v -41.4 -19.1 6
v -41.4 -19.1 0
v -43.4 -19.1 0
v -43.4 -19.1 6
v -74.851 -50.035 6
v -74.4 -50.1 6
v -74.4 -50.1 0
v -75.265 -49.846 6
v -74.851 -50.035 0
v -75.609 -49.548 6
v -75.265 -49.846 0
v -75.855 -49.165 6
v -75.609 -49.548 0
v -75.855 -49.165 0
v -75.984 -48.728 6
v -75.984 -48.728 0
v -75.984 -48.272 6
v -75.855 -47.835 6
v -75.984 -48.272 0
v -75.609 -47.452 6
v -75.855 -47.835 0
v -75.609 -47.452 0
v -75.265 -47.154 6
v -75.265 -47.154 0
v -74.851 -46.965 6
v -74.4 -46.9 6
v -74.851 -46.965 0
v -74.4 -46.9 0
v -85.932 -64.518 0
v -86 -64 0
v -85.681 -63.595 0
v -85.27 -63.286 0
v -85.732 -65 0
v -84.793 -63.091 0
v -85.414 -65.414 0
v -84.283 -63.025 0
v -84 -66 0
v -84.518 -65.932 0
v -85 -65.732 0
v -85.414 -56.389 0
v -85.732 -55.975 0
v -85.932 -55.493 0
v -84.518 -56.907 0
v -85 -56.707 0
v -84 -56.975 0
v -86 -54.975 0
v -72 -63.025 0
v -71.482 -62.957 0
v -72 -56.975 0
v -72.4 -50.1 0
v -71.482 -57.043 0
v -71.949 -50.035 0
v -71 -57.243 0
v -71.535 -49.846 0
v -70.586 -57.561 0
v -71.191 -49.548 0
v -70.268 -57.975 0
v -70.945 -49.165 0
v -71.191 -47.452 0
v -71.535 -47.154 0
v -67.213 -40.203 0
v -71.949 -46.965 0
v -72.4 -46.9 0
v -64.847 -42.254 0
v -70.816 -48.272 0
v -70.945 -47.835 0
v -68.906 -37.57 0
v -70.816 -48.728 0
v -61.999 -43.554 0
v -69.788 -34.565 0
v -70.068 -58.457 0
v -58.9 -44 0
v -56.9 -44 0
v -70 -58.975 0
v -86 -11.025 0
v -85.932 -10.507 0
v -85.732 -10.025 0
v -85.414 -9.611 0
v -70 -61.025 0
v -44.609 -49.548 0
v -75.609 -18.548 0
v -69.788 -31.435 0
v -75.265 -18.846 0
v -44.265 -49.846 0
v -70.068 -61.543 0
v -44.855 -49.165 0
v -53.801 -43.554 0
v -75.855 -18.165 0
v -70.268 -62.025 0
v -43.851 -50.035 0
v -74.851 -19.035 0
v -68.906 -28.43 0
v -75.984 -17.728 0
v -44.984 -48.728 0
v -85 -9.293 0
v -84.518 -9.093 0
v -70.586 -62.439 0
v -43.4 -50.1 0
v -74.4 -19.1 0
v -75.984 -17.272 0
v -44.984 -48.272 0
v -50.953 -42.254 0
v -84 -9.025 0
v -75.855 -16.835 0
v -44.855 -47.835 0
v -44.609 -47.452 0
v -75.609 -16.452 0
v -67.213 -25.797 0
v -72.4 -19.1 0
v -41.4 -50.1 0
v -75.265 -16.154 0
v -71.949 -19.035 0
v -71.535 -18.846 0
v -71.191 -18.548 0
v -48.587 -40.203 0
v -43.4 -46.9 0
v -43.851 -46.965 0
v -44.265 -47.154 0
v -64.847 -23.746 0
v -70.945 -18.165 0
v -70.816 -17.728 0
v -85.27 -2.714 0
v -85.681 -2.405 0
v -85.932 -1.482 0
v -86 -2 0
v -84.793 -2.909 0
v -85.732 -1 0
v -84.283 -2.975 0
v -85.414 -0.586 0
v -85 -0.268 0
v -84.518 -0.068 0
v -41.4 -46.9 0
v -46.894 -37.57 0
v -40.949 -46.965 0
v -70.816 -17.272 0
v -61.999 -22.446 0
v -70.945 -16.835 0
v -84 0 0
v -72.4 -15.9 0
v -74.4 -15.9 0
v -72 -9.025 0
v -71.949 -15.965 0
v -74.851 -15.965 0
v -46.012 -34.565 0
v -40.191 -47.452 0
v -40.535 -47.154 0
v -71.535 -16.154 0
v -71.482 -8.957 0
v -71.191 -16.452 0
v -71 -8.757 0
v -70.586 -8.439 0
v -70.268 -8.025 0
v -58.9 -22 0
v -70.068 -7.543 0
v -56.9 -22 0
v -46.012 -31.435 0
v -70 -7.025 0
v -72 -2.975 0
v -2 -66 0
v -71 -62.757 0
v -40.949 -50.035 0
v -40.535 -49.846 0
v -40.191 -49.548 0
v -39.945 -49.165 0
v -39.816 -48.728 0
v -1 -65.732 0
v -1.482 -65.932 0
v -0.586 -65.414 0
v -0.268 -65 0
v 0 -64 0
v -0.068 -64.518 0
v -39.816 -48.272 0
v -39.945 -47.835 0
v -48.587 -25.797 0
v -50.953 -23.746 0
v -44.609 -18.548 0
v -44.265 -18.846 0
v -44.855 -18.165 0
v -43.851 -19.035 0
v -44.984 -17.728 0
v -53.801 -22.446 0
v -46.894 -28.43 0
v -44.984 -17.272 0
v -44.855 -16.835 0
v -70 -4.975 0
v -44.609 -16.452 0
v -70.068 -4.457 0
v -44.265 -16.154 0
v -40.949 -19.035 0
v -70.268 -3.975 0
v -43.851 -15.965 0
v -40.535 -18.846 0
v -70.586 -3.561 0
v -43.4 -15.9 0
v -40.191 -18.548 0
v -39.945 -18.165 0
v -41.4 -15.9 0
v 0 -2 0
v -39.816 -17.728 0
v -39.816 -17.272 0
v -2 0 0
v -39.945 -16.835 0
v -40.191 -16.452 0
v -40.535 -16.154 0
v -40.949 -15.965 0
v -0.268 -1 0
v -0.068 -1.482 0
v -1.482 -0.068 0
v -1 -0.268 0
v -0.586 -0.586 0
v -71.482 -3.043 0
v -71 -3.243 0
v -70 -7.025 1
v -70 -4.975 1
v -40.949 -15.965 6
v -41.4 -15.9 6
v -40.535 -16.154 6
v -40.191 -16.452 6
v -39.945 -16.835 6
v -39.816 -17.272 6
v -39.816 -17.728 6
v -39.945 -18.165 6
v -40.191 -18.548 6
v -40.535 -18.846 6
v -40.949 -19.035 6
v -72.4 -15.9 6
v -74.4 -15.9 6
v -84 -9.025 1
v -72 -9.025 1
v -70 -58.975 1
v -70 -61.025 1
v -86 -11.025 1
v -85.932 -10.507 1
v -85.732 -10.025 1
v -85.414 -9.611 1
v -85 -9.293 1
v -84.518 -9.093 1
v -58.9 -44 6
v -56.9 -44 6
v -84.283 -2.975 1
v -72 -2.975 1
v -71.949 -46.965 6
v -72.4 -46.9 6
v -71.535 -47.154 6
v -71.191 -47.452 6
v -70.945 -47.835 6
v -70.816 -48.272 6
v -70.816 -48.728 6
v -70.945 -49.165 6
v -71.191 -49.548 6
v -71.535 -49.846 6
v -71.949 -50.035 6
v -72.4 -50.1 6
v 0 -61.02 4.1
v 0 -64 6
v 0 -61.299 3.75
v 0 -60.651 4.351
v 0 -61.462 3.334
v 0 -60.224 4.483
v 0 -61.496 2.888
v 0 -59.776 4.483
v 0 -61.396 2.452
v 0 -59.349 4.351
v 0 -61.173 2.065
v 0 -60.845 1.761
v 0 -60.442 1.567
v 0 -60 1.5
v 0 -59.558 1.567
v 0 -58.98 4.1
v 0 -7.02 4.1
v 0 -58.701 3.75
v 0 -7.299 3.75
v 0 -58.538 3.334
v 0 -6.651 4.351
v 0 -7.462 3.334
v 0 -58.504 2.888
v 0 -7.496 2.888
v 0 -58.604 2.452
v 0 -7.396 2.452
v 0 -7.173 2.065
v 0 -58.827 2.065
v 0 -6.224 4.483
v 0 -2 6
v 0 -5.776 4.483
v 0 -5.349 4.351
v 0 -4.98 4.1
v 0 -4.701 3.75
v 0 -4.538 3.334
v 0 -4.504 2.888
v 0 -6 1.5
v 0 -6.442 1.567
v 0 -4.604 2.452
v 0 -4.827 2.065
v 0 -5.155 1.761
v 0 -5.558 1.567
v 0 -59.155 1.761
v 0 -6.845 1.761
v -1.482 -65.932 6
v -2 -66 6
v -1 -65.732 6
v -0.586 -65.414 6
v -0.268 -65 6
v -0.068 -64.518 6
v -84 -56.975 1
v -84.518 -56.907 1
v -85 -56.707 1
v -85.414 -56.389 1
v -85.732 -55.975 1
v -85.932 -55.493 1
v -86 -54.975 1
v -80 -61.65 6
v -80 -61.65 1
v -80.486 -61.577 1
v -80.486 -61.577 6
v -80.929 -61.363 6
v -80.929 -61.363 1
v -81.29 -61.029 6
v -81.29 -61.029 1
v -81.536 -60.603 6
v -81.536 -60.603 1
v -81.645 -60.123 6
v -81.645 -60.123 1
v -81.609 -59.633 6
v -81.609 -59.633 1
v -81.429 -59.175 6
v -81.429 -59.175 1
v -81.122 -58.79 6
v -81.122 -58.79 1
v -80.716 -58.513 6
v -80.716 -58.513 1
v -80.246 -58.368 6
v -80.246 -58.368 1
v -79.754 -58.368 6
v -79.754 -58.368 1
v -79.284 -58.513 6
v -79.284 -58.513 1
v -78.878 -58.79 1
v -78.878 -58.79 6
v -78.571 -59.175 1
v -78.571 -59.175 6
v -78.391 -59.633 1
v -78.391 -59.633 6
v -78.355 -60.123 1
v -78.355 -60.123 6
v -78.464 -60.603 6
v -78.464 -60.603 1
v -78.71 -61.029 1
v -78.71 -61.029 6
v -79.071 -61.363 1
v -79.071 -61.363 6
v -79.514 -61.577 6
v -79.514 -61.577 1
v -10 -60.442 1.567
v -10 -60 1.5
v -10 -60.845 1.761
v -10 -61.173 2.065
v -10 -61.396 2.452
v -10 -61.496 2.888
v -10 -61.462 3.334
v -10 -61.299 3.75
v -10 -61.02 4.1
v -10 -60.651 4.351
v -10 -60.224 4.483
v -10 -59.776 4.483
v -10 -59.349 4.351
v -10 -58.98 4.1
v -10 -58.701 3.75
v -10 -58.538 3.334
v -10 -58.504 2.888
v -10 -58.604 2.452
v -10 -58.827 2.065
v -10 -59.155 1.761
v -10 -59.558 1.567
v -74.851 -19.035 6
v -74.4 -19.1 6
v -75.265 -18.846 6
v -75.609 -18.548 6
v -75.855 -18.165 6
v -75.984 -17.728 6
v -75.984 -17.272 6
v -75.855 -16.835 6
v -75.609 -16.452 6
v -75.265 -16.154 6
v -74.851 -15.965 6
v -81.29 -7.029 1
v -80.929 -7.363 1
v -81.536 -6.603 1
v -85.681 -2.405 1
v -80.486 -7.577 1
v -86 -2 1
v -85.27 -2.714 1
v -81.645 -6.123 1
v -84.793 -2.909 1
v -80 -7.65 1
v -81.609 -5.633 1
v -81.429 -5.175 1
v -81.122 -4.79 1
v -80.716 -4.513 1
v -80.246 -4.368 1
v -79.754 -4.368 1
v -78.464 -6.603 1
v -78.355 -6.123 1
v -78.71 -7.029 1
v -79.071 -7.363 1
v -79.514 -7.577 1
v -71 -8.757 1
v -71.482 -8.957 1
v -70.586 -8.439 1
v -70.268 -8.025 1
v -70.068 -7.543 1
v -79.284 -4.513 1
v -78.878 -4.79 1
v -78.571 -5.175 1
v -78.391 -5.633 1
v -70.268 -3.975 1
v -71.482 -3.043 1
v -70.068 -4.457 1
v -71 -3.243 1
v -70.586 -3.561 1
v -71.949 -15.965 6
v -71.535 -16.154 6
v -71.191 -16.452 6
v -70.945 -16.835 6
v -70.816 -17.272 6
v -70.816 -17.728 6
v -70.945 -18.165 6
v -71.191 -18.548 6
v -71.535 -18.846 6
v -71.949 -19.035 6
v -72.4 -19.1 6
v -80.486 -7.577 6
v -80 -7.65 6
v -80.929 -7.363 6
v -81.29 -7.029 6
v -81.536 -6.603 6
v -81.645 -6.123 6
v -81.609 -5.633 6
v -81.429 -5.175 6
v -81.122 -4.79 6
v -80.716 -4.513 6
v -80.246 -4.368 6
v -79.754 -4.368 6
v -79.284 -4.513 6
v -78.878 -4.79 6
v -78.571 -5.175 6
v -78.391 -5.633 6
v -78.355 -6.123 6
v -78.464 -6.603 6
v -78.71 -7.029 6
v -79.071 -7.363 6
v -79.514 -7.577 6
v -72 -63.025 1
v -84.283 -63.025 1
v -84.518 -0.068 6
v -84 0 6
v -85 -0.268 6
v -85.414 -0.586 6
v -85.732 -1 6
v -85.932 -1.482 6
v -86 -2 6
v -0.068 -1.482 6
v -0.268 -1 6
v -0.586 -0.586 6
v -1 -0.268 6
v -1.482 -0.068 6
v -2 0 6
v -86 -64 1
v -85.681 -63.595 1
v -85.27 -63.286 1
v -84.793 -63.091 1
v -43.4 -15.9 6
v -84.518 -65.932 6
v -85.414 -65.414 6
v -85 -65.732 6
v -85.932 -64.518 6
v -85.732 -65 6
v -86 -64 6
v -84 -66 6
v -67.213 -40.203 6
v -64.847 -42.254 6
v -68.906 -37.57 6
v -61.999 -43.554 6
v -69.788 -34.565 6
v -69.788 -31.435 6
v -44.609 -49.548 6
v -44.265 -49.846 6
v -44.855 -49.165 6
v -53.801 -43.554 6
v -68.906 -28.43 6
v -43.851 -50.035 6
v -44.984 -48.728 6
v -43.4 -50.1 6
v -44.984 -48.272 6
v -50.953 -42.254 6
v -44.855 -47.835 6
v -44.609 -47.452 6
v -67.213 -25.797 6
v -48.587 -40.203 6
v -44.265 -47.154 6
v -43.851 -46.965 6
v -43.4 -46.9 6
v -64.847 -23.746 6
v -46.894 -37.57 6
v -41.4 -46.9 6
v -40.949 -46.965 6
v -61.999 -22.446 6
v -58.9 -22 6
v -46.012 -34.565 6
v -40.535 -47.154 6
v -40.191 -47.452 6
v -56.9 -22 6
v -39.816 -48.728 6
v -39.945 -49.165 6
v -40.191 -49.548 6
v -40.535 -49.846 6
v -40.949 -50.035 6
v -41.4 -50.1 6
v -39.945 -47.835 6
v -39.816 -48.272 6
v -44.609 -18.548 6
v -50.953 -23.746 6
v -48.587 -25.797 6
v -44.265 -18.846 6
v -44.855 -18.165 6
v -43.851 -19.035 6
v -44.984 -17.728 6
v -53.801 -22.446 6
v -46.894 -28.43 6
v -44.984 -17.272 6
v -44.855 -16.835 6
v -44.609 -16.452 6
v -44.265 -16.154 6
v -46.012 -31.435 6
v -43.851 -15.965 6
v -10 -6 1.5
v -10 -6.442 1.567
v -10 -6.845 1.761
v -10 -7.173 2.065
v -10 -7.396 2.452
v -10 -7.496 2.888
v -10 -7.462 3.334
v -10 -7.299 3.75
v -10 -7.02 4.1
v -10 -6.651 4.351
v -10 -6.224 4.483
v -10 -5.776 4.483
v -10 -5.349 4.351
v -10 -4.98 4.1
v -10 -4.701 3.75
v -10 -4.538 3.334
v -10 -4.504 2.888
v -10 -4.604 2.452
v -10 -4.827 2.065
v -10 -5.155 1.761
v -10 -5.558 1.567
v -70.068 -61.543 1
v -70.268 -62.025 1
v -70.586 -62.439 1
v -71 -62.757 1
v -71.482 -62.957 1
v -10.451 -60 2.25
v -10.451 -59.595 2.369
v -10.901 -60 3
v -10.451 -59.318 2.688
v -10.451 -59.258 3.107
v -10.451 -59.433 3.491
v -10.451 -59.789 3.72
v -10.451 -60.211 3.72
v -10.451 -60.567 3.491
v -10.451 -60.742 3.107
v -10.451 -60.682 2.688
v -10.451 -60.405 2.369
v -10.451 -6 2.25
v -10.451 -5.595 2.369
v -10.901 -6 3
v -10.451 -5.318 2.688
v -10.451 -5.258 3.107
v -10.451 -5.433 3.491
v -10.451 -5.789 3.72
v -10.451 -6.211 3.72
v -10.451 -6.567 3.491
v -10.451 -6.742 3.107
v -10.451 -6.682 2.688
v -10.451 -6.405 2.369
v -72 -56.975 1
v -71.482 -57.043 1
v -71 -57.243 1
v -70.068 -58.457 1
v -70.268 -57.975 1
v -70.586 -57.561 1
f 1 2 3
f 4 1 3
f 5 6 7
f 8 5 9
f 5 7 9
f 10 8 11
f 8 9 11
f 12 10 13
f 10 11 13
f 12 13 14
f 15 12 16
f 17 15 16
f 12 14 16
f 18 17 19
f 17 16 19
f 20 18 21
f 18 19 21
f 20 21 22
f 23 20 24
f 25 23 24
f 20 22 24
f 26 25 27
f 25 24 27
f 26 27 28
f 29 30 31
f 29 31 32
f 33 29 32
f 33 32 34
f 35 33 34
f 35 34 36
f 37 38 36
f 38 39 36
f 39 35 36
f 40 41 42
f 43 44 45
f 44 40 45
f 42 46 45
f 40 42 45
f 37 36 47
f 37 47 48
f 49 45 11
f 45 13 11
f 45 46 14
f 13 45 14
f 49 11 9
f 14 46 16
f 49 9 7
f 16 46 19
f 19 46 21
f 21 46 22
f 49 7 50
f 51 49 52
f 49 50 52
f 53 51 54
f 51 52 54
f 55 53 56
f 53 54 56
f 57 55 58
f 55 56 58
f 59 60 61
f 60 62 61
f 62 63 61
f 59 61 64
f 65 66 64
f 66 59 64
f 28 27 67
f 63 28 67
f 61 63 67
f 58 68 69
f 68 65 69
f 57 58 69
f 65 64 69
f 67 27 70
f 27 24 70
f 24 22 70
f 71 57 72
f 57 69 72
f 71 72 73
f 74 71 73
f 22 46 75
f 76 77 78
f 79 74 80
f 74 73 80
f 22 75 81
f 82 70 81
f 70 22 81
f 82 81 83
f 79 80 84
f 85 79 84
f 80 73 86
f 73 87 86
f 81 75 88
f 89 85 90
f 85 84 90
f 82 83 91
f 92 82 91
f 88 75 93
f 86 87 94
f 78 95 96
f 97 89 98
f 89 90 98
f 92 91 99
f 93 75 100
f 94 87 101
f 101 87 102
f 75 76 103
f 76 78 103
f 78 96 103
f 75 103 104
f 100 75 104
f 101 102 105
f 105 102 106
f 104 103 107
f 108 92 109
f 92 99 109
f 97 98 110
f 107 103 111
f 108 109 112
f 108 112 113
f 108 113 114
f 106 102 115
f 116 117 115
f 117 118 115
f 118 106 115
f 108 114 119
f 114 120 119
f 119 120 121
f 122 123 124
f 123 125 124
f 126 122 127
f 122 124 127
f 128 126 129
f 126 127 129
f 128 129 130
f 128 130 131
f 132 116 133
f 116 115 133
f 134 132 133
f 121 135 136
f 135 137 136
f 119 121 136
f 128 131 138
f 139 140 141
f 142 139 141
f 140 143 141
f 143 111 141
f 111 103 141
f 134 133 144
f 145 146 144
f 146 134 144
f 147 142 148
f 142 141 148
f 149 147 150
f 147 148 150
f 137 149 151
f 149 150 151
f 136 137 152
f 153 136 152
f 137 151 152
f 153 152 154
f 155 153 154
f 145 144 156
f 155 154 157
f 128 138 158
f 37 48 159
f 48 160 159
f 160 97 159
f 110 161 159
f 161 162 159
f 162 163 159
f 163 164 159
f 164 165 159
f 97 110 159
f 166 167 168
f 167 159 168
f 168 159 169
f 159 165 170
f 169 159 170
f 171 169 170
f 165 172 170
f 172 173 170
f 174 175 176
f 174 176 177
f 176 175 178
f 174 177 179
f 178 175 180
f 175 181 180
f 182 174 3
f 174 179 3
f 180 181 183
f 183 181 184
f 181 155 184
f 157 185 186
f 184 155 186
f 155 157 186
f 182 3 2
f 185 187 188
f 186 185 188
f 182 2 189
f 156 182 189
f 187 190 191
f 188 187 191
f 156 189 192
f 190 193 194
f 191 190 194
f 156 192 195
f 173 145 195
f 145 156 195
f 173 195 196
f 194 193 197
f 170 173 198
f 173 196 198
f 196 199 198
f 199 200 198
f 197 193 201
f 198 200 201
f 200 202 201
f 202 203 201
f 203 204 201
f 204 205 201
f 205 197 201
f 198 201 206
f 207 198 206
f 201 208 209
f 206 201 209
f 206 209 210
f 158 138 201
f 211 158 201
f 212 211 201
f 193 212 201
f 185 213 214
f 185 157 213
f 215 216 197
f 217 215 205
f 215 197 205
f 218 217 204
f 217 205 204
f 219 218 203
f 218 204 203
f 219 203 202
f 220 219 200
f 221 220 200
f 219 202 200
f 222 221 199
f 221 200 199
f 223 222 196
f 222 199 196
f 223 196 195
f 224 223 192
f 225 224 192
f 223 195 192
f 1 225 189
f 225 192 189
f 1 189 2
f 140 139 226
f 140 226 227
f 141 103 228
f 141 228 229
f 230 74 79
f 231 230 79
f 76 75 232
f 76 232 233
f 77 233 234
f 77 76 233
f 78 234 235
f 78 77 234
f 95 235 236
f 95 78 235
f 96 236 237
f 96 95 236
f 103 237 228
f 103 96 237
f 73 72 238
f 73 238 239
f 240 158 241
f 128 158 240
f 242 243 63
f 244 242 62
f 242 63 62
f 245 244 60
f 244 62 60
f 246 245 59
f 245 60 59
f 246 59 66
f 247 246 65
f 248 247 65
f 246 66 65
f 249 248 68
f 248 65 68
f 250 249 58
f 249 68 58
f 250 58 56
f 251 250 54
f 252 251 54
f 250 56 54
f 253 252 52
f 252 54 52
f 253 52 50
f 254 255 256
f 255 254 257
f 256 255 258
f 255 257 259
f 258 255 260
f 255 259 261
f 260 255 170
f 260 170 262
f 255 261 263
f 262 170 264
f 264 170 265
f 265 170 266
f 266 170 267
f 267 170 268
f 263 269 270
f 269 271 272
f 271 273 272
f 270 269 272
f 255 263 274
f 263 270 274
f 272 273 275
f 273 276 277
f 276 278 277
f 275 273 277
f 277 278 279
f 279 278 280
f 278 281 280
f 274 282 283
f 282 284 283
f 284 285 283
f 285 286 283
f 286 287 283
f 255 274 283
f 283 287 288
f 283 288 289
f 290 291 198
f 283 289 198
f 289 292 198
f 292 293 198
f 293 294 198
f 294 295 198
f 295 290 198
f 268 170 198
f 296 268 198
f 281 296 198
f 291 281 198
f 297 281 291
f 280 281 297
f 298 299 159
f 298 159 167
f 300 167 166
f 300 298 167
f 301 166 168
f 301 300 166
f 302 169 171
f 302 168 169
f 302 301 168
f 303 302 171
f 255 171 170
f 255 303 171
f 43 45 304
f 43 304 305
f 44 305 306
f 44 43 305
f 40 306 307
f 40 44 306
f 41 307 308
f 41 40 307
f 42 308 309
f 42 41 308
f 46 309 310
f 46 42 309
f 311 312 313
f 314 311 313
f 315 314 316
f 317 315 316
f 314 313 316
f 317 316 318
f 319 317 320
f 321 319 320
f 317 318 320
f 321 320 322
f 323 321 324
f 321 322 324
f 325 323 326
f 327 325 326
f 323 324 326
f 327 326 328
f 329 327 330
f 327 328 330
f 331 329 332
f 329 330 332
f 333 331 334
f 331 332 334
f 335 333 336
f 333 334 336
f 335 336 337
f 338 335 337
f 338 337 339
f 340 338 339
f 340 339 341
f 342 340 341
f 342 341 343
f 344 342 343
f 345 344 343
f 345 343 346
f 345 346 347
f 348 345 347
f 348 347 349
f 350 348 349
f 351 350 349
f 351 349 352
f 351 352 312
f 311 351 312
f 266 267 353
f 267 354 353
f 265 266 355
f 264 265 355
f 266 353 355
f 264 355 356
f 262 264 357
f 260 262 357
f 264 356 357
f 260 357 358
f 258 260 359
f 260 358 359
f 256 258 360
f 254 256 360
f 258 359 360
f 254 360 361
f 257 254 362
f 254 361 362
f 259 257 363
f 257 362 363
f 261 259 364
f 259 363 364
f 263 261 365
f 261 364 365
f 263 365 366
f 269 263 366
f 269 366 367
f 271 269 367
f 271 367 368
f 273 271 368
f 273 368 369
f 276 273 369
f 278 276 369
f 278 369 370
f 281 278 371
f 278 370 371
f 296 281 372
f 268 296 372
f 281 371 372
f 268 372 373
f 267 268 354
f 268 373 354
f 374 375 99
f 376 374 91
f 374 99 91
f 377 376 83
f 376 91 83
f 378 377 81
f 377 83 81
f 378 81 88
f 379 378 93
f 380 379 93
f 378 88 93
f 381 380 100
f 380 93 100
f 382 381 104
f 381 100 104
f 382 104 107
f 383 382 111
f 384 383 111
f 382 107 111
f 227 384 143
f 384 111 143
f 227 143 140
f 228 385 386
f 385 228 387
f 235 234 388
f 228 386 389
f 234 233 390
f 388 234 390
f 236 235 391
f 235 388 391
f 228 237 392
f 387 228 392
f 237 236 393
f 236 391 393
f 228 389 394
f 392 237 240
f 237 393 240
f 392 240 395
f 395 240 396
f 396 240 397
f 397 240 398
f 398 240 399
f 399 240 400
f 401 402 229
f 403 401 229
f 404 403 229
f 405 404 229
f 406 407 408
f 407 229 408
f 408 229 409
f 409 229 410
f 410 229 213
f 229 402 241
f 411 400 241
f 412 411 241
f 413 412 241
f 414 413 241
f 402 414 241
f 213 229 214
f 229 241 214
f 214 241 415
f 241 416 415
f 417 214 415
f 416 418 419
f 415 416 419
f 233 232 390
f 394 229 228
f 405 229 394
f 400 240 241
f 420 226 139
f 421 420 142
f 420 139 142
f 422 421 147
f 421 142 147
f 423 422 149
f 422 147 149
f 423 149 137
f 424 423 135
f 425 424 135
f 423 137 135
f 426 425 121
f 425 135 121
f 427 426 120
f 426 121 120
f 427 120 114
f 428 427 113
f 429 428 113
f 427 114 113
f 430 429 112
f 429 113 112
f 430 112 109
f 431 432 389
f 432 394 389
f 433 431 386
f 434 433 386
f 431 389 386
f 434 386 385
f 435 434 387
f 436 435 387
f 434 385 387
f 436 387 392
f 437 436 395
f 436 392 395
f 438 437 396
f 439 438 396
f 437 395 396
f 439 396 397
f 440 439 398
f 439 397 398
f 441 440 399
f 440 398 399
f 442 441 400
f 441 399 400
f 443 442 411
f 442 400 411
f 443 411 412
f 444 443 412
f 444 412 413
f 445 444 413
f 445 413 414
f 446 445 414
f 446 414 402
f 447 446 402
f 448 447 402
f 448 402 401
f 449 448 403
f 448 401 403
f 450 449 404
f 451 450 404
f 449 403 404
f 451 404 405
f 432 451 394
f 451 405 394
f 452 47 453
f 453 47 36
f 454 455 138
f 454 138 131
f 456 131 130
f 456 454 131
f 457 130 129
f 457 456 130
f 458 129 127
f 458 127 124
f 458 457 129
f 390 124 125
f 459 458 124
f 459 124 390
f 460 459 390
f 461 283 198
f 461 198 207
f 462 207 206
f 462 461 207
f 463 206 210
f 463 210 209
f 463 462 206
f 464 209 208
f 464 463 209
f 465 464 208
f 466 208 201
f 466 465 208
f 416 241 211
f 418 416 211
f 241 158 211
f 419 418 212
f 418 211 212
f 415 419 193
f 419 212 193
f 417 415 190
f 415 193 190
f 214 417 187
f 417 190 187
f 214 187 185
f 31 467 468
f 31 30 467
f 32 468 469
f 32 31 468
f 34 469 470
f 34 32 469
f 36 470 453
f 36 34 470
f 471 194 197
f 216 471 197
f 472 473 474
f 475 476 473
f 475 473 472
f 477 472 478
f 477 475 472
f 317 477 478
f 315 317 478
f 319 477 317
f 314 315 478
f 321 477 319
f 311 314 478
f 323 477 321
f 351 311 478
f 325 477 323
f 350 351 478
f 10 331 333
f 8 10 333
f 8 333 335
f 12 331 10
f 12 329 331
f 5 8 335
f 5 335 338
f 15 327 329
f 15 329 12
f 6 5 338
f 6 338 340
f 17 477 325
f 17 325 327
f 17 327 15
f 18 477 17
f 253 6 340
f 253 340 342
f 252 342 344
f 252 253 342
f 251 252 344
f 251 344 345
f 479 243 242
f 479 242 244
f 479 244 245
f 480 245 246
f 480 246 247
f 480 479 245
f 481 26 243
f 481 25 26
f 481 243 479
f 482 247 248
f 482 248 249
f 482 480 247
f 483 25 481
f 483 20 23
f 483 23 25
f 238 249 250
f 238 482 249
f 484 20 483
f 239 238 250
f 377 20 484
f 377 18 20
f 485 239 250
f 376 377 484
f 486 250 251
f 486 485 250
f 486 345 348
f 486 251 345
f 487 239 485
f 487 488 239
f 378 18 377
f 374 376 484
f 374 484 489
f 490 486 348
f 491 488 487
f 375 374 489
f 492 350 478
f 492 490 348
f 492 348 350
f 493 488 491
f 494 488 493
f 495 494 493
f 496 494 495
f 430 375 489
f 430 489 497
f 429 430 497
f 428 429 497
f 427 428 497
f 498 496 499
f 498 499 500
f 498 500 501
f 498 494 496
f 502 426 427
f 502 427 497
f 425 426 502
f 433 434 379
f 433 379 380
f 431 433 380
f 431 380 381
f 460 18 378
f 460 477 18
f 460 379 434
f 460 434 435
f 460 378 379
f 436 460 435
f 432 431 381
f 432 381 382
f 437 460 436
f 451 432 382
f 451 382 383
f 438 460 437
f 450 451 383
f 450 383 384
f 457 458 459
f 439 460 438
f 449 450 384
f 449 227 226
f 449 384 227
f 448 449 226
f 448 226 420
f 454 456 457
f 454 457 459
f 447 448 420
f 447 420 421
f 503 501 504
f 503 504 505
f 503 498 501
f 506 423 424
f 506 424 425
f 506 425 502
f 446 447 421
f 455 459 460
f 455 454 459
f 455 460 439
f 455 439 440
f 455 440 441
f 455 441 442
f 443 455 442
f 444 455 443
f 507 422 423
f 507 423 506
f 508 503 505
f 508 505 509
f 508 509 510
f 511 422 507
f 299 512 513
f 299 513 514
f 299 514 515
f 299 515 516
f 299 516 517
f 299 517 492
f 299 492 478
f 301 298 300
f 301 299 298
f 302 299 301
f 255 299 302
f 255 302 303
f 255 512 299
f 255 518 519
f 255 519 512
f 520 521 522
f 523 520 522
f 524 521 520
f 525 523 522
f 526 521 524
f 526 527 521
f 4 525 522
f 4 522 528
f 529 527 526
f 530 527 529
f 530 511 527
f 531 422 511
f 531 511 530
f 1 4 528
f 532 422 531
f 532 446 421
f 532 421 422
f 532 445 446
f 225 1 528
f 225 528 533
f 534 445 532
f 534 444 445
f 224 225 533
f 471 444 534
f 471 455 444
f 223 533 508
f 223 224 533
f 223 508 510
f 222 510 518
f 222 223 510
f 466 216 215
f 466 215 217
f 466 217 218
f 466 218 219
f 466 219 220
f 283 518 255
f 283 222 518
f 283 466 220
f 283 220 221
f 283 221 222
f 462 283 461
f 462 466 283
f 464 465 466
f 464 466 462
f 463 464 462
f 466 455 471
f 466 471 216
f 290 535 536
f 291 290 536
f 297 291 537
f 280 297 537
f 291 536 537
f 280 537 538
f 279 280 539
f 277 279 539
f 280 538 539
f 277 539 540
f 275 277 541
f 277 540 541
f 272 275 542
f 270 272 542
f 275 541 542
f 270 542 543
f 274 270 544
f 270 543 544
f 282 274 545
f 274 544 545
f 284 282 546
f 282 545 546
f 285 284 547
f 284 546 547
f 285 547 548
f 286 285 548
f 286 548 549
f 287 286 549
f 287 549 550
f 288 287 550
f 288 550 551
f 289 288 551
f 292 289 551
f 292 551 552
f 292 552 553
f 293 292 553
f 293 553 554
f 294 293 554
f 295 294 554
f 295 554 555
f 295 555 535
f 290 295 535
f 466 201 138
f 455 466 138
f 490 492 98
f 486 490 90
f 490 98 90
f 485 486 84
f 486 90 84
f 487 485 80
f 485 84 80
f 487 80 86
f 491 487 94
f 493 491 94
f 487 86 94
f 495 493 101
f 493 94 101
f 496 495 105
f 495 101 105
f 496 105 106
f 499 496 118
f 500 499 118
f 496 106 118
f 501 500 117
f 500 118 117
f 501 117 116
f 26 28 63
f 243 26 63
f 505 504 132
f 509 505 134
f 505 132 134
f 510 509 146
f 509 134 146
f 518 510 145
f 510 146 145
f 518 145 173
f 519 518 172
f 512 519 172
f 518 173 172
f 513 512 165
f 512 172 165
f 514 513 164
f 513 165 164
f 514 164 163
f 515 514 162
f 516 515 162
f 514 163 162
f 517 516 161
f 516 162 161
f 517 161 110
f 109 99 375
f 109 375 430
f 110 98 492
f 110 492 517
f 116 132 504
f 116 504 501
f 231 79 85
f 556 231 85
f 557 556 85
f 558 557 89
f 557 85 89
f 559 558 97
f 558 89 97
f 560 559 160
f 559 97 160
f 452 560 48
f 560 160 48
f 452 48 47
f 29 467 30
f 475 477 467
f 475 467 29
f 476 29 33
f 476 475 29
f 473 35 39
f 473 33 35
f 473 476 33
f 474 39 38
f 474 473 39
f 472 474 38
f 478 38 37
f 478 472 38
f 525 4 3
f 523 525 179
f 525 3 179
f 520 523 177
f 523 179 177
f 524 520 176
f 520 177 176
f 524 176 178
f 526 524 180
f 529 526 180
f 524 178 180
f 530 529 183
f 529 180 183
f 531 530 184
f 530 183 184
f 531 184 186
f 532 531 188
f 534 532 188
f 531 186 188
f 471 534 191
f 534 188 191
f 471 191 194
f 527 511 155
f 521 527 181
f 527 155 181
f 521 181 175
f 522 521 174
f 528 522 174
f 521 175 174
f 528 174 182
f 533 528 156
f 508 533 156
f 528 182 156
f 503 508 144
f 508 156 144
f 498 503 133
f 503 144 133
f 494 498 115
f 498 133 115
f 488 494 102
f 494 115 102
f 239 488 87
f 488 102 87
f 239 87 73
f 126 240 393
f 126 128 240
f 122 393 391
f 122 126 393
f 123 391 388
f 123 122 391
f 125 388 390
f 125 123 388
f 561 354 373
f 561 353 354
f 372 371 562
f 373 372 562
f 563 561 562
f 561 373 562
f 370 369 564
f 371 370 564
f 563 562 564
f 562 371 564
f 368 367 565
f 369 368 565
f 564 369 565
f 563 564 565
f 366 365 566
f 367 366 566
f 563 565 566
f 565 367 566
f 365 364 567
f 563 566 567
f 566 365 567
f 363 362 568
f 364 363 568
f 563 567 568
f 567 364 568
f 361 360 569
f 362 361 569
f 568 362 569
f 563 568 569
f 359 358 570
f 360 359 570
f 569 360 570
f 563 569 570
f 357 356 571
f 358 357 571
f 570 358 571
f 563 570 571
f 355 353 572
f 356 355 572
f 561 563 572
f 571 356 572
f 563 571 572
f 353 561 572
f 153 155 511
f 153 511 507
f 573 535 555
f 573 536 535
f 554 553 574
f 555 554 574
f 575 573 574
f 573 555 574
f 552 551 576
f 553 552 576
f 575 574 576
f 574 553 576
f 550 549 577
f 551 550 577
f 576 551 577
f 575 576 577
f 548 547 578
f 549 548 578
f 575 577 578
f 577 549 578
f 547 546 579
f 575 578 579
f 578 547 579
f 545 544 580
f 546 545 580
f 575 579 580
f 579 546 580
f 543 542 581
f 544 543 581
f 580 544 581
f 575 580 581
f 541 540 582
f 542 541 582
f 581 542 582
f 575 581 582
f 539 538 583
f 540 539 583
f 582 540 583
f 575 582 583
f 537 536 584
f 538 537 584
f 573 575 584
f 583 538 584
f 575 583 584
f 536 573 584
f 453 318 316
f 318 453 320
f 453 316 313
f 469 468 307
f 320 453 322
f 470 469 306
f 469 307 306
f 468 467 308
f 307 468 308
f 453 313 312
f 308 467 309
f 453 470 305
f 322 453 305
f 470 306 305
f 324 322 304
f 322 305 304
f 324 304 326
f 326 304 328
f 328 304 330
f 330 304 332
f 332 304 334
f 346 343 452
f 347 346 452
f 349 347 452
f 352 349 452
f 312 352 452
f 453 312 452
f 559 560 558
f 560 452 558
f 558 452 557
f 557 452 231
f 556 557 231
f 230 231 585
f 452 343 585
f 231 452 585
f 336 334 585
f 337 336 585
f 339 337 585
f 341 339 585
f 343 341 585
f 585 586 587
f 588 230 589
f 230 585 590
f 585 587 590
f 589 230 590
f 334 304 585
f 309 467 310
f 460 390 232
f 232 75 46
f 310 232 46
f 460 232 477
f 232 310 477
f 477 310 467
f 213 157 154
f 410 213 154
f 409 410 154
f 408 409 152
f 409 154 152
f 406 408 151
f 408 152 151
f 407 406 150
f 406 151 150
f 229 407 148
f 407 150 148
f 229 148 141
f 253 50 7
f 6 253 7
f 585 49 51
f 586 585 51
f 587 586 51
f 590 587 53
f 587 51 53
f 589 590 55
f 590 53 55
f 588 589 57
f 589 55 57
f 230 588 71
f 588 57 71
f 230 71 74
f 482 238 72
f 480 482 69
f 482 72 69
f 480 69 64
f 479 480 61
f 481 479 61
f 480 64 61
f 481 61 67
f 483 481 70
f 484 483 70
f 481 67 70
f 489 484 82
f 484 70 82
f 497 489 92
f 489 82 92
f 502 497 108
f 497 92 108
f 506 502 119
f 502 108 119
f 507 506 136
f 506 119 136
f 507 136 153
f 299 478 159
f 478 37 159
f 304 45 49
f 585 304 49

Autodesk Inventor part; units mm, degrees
ref_plane "YZ Plane" through (0, 0, 0) normal (1, 0, 0) x (0, 1, 0)
sketch "Skizze3" plane through (0, 0, 0) normal (0, 0, 1) x (1, 0, 0)
  line L0 (0, 0) -> (-86, 0)
  line L1 (-86, 0) -> (-86, -66)
  line L2 (-86, -66) -> (0, -66)
  line L3 (0, -66) -> (0, 0)
  line L4 (-57.9, -33) -> (-86, -33) construction
  line L5 (-42.4, -48.5) -> (-73.4, -48.5) construction
  line L6 (-74.4, -48.5) -> (-72.4, -48.5) construction
  line L7 (-74.4, -46.9) -> (-72.4, -46.9)
  line L8 (-72.4, -50.1) -> (-74.4, -50.1)
  arc A0 (-74.4, -46.9) -> (-74.4, -50.1) centre (-74.4, -48.5) ccw
  arc A1 (-72.4, -50.1) -> (-72.4, -46.9) centre (-72.4, -48.5) ccw
  line L9 (-43.4, -48.5) -> (-41.4, -48.5) construction
  line L10 (-43.4, -50.1) -> (-41.4, -50.1)
  line L11 (-41.4, -46.9) -> (-43.4, -46.9)
  arc A2 (-43.4, -46.9) -> (-43.4, -50.1) centre (-43.4, -48.5) ccw
  arc A3 (-41.4, -50.1) -> (-41.4, -46.9) centre (-41.4, -48.5) ccw
  line L12 (-74.4, -19.1) -> (-72.4, -19.1)
  line L13 (-72.4, -15.9) -> (-74.4, -15.9)
  arc A4 (-74.4, -15.9) -> (-74.4, -19.1) centre (-74.4, -17.5) ccw
  arc A5 (-72.4, -19.1) -> (-72.4, -15.9) centre (-72.4, -17.5) ccw
  line L14 (-43.4, -15.9) -> (-41.4, -15.9)
  line L15 (-41.4, -19.1) -> (-43.4, -19.1)
  arc A6 (-43.4, -15.9) -> (-43.4, -19.1) centre (-43.4, -17.5) ccw
  arc A7 (-41.4, -19.1) -> (-41.4, -15.9) centre (-41.4, -17.5) ccw
  line L16 (-58.9, -33) -> (-56.9, -33) construction
  line L17 (-58.9, -44) -> (-56.9, -44)
  line L18 (-56.9, -22) -> (-58.9, -22)
  arc A8 (-58.9, -22) -> (-58.9, -44) centre (-58.9, -33) ccw
  arc A9 (-56.9, -44) -> (-56.9, -22) centre (-56.9, -33) ccw
  point P0 (-57.9, -48.5)
  dimension "d4" = 86
  dimension "d5" = 66
  dimension "d44" = 31
  dimension "d53" = 28.1
  dimension "d54" = 15.5
  dimension "d55" = 1.6
  dimension "d56" = 2
  dimension "d57" = 1.6
  dimension "d58" = 2
  dimension "d59" = 2
  dimension "d60" = 11
extrude "Extrusion3" add sketch "Skizze3" along normal blind 6 contours L3 L2 L1 L0 | L7 A1 L8 A0 | A2 L11 A3 L10 | A4 L13 A5 L12 | L14 A7 L15 A6 | A8 L18 A9 L17
sketch "Skizze4" plane through (0, -66, 0) normal (1, 0, 0) x (0, 0, -1)
  line L0 (0, 0) -> (-6, 0) projected
  line L1 (-3, 0) -> (-3, 70) construction
  line L2 (0, 66) -> (0, 0) projected
  line L3 (0, 66) -> (-6, 66) projected
  point P0 (-3, 60)
  point P1 (-3, 6)
  dimension "d10" = 6
  dimension "d11" = 6
hole "Bohrung1" at (0, -6, 3) at (0, -60, 3) direction (-1, 0, 0) diameter 3 depth 10 tip angle 118
thread "Gewinde2" size "M3x0.5" class "6H" standard "ISO Metric profile" length 8
thread "Gewinde3" size "M3x0.5" class "6H" standard "ISO Metric profile" length 8
sketch "Skizze5" plane through (0, 0, 6) normal (0, 0, 1) x (1, 0, 0)
  line L0 (0, -60) -> (-86, -60) construction
  line L1 (-86, 0) -> (-86, -66) projected
  line L2 (-70, -63.025) -> (-86, -63.025)
  line L3 (-86, -63.025) -> (-86, -56.975)
  line L4 (-86, -56.975) -> (-70, -56.975)
  line L5 (-70, -56.975) -> (-70, -63.025)
  line L6 (0, -66) -> (0, 0) projected
  line L7 (0, -33) -> (-86, -33) construction
  line L8 (-70, -2.975) -> (-86, -2.975)
  line L9 (-86, -2.975) -> (-86, -9.025)
  line L10 (-86, -9.025) -> (-70, -9.025)
  line L11 (-70, -9.025) -> (-70, -2.975)
  point P0 (0, -6)
  point P1 (-80, -60)
  point P2 (-70, -60)
  point P3 (-80, -6)
  point P4 (-86, -2.975)
  point P5 (-86, -9.025)
  dimension "d26" = 6
  dimension "d34" = 16
  dimension "d35" = 6.05
hole "Bohrung2" at (-80, -60, 6) at (-80, -6, 6) direction (0, 0, -1) diameter 3.3 depth 8.1
sketch "Skizze6" plane through (0, 0, 0) normal (0, 0, -1) x (-1, 0, 0)
  line L0 (86, -9.025) -> (70, -9.025) projected
  line L1 (70, -9.025) -> (70, -2.975) projected
  line L2 (70, -2.975) -> (86, -2.975) projected
  line L3 (86, -56.975) -> (70, -56.975) projected
  line L4 (70, -63.025) -> (86, -63.025) projected
  line L5 (70, -56.975) -> (70, -63.025) projected
  line L6 (86, 0) -> (86, -66) projected
  point P0 (0, 0)
  point P1 (80, -6)
extrude "Extrusion5" cut sketch "Skizze6" against normal blind 1
fillet "Rundung3" radius 2 4 edges at (0, -66, 3) (0, 0, 3) (-86, -66, 3) (-86, 0, 3)
fillet "Rundung4" radius 2 8 edges at (-86, -2.975, 0.5) (-86, -9.025, 0.5) (-70, -2.975, 0.5) (-70, -9.025, 0.5) (-86, -56.975, 0.5) (-86, -63.025, 0.5) (-70, -56.975, 0.5) (-70, -63.025, 0.5)
extrude "Extrusion6" cut sketch "Skizze3" along normal blind 10 contours L7 A1 L8 A0 | A2 L11 A3 L10 | A4 L13 A5 L12 | L14 A7 L15 A6 | A8 L18 A9 L17
ref_plane "Arbeitsebene1" through (-73.4, -48.5, 0) normal (-1, 0, 0) x (0, 0, 1)
ref_plane "Arbeitsebene2" through (-42.4, -48.5, 0) normal (-1, 0, 0) x (0, 0, 1)
equation "\"d54\" = 0.5 * d44"
equation "\"d57\" = d55"
properties part number "BT901_goteln20_23" material "Acryl"
